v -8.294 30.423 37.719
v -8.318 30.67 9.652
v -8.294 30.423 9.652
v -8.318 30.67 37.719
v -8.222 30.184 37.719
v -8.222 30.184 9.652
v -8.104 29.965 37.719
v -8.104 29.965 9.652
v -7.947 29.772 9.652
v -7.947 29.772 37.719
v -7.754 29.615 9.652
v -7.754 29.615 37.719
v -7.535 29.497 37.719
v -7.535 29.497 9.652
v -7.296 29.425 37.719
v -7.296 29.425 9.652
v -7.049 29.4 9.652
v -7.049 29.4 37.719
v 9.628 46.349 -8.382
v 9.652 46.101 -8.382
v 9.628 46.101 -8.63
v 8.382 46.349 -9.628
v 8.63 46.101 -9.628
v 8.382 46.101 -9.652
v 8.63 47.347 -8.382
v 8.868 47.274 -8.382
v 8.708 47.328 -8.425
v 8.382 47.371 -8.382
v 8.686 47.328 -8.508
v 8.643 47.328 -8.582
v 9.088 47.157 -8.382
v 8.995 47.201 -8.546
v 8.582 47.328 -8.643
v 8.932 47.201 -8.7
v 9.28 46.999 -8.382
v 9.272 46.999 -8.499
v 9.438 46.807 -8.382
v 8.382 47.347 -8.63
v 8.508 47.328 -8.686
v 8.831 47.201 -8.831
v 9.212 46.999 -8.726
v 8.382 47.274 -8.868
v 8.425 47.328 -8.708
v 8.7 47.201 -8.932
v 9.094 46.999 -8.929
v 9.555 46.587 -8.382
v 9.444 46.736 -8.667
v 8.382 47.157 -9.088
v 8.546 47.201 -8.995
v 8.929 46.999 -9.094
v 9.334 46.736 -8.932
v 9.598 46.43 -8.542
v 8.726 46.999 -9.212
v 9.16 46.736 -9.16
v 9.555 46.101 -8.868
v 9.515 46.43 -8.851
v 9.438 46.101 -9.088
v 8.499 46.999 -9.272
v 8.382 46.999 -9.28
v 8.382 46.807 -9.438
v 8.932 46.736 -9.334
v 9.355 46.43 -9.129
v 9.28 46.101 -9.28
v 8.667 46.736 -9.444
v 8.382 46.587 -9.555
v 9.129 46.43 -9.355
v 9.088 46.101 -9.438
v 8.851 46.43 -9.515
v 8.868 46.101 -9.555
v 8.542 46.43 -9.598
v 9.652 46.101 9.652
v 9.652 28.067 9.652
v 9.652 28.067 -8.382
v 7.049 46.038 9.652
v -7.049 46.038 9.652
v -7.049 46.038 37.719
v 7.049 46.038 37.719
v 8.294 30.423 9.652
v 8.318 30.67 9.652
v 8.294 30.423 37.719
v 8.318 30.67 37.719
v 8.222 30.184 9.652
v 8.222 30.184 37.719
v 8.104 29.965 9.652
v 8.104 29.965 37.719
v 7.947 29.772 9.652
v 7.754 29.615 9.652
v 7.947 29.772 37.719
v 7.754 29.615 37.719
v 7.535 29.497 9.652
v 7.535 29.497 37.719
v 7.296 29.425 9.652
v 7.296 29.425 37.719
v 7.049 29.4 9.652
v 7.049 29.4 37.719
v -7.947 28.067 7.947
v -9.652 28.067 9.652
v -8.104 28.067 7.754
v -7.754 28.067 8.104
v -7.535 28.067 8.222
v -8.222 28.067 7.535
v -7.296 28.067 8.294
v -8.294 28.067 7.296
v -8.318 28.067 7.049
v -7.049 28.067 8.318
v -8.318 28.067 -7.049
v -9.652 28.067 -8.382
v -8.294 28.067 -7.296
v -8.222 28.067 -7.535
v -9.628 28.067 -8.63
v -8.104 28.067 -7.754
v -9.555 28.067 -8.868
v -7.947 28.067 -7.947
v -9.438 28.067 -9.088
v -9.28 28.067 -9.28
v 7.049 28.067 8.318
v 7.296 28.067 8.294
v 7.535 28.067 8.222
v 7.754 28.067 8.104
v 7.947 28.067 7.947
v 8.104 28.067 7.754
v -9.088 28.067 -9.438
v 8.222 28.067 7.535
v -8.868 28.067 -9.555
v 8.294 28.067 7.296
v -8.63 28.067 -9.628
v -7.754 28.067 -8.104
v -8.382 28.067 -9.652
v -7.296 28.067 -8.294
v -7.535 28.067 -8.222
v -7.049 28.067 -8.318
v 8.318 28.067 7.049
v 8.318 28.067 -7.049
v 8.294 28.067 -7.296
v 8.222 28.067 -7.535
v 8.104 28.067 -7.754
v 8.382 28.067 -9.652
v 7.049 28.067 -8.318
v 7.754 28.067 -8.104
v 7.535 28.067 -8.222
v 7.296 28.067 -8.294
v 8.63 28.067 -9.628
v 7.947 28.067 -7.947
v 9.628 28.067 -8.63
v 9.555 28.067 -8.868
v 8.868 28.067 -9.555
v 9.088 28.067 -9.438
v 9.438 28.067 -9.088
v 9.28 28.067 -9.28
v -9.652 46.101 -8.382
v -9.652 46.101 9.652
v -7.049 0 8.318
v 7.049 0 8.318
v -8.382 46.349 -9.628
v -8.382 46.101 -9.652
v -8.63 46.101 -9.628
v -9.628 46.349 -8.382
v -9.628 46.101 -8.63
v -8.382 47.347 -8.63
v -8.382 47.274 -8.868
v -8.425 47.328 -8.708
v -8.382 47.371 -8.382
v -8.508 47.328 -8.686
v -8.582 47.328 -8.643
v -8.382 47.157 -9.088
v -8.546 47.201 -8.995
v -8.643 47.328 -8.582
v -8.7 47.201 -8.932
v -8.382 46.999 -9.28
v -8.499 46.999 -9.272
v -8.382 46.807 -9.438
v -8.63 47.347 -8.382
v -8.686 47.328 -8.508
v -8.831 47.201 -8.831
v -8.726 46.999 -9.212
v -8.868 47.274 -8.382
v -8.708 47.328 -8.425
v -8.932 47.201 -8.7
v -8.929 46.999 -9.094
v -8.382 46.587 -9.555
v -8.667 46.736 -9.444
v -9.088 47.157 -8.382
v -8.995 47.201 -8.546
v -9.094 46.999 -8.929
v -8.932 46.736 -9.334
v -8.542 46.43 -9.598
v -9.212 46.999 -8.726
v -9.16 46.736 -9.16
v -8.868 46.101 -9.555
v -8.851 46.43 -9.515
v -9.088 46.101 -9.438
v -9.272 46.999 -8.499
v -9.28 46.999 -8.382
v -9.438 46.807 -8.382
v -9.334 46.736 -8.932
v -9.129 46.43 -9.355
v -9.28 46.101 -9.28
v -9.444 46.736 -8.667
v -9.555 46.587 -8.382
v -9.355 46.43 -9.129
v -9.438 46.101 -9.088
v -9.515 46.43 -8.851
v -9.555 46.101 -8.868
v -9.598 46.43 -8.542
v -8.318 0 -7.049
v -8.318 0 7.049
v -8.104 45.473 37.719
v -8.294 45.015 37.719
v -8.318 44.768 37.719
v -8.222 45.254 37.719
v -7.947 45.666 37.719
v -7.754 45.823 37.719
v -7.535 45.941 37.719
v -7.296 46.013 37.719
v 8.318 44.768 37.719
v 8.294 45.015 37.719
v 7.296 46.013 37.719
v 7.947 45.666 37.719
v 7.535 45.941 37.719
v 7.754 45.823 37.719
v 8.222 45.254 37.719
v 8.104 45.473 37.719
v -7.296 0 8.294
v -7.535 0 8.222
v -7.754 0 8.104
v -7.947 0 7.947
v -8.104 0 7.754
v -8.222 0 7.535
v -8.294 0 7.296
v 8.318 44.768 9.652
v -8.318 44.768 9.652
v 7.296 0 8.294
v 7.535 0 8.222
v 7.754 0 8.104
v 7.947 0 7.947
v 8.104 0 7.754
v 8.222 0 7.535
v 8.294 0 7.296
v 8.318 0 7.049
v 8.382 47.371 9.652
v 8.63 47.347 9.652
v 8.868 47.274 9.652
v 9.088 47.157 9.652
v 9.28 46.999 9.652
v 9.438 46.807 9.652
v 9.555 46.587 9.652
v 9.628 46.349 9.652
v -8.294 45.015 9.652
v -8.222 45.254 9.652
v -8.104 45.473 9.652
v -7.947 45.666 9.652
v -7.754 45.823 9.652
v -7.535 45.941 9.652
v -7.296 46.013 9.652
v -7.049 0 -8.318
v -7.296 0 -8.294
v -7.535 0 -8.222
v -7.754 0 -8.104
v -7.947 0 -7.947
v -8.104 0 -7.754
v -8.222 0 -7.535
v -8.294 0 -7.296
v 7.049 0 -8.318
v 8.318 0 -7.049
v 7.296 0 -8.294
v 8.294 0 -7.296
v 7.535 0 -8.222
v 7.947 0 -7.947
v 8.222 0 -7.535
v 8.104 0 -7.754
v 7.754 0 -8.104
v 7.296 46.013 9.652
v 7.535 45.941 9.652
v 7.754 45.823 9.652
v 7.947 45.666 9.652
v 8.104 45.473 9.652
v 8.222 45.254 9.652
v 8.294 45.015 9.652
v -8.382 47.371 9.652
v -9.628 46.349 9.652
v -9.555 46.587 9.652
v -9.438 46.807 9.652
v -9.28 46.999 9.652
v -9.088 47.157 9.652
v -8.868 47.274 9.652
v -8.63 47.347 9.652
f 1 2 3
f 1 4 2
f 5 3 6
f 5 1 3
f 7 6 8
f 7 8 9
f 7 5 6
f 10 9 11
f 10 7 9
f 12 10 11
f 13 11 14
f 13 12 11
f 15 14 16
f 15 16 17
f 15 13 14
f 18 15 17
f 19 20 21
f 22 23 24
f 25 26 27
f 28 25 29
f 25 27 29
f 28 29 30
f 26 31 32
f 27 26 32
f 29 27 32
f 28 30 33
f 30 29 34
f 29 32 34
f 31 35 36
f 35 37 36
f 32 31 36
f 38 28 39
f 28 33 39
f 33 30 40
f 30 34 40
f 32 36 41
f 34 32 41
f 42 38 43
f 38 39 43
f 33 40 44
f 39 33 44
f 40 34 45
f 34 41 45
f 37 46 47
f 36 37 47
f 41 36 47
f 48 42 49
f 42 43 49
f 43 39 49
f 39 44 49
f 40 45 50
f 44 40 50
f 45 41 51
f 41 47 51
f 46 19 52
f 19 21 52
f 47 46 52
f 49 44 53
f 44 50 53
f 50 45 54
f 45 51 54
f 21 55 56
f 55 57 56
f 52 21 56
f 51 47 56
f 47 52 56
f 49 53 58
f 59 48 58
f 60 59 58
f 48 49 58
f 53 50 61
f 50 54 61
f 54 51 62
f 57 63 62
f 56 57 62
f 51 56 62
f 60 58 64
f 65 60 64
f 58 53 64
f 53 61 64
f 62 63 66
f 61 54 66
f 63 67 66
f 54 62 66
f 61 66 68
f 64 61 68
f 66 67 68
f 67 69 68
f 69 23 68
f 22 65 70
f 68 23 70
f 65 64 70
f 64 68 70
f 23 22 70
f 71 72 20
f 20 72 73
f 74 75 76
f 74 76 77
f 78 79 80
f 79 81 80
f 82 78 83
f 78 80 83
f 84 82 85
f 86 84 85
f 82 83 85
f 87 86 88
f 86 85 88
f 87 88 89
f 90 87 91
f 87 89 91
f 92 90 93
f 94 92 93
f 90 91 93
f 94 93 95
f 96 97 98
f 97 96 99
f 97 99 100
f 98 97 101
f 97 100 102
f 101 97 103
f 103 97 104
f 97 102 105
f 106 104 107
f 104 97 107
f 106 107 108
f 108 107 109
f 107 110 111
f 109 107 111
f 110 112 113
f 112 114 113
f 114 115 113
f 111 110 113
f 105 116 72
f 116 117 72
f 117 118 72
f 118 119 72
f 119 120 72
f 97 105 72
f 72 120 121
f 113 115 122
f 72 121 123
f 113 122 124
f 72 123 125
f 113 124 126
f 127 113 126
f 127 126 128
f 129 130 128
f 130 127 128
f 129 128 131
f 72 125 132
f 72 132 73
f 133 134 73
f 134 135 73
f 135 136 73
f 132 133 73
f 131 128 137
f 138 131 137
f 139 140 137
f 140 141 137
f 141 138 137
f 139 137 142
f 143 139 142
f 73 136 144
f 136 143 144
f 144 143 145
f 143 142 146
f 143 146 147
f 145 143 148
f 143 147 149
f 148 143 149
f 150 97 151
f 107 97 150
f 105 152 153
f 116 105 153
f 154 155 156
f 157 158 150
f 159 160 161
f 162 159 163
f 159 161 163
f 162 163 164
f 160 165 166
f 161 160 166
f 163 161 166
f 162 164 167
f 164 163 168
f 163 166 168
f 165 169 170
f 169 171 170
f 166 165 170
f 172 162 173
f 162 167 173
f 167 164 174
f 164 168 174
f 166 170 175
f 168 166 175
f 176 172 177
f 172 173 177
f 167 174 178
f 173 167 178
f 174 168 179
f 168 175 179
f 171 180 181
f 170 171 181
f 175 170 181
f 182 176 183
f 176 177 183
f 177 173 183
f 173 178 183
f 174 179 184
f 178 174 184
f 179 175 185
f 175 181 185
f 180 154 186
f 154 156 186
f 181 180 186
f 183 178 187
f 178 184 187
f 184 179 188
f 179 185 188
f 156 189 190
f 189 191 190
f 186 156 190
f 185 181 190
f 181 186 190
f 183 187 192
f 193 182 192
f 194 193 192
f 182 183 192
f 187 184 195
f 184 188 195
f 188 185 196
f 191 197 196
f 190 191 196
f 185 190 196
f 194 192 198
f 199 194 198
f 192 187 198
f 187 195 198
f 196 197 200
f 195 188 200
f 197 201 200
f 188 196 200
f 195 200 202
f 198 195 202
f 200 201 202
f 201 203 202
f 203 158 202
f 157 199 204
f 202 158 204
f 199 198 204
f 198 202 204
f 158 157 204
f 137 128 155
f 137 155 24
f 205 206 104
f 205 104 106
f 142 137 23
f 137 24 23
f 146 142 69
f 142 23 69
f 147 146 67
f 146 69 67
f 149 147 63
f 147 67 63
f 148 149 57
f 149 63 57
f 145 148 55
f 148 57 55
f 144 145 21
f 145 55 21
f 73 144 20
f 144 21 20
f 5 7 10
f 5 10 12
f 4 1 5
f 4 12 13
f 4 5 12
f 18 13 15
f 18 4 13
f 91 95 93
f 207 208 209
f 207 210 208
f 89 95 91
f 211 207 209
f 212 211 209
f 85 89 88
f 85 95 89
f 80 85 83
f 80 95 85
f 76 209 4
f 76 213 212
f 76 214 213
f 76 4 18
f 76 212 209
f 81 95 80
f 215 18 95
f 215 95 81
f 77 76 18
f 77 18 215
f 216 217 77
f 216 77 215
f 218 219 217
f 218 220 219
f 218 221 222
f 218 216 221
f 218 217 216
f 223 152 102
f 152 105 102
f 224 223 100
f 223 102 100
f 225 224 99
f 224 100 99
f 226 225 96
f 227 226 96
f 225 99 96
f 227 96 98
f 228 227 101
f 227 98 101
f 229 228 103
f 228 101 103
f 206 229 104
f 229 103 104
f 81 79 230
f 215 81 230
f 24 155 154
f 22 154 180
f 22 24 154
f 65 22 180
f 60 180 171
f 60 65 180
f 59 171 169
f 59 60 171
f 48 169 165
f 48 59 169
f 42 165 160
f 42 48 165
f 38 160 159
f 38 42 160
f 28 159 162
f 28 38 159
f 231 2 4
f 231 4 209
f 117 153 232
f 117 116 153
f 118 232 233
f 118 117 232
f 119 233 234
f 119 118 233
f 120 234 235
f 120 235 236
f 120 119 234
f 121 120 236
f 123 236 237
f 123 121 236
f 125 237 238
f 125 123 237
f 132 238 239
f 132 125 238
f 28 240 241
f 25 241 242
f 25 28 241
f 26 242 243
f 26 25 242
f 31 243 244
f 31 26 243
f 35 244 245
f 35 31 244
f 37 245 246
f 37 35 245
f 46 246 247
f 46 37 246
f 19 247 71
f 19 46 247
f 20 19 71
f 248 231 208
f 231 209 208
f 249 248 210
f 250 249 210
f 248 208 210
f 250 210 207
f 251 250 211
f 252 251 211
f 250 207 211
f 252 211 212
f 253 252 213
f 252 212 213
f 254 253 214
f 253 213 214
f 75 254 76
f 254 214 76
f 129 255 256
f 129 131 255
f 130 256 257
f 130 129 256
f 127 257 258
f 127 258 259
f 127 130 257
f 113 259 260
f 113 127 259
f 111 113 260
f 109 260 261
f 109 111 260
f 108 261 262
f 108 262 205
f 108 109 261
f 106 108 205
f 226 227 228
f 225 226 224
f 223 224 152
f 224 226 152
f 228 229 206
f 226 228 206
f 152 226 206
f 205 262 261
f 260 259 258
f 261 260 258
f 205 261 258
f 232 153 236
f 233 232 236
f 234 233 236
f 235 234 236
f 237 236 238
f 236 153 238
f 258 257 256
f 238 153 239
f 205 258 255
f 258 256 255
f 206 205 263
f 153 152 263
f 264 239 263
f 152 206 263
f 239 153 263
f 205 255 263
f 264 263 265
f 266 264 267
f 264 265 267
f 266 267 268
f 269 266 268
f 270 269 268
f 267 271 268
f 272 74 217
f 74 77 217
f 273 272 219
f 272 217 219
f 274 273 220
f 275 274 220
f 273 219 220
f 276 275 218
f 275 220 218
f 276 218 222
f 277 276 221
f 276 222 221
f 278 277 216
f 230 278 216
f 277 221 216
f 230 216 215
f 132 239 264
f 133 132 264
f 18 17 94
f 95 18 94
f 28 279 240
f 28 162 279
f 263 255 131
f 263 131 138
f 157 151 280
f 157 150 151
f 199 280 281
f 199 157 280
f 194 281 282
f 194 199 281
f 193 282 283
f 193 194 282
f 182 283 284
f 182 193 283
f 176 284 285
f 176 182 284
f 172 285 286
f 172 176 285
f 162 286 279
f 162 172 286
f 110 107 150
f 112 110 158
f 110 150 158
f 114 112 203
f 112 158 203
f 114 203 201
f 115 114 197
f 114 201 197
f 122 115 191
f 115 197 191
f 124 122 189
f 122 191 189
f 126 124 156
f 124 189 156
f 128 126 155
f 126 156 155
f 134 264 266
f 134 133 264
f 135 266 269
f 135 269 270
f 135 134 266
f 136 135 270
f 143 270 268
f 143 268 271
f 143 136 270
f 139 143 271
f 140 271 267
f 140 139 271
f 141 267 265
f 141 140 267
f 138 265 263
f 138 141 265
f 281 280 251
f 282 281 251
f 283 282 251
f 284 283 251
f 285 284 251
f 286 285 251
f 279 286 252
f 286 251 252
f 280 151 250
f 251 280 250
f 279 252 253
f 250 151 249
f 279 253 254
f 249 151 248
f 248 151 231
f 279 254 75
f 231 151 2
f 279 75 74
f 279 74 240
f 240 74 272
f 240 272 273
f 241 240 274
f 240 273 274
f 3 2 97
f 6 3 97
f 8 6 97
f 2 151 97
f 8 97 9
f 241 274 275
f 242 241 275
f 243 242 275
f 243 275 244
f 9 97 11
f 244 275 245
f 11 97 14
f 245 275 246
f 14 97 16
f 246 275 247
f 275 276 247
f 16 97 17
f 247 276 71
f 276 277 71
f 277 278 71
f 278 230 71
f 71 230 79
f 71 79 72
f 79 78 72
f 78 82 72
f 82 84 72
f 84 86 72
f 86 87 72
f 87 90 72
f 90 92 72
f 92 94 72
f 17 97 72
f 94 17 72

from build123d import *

# Parameters (mm, degrees)
SKETCH1_W           = 16.637
SKETCH1_H           = 16.637
BOSS_EXTRUDE1_DEPTH = 28.067
SKETCH2_W           = 19.304
SKETCH2_H           = 19.304
BOSS_EXTRUDE2_DEPTH = 19.304
SKETCH3_W           = 16.637
SKETCH3_H           = 16.637
BOSS_EXTRUDE3_DEPTH = 28.067
FILLET1_R           = 1.27


with BuildPart() as part:
    # Sketch1 → Boss-Extrude1 (new body)
    with BuildSketch(Plane(origin=(0, 0, 0), x_dir=(1, 0, 0), z_dir=(0, 1, 0))):
        Rectangle(SKETCH1_W, SKETCH1_H)
    extrude(amount=BOSS_EXTRUDE1_DEPTH)

    # Sketch2 → Boss-Extrude2 (add)
    with BuildSketch(Plane(origin=(0, 28.067, 0), x_dir=(1, 0, 0), z_dir=(0, 1, 0))):
        Rectangle(SKETCH2_W, SKETCH2_H)
    extrude(amount=BOSS_EXTRUDE2_DEPTH)

    # Sketch3 → Boss-Extrude3 (add)
    with BuildSketch(Plane.XY.offset(9.652)):
        with Locations((0, 37.719)):
            Rectangle(SKETCH3_W, SKETCH3_H)
    extrude(amount=BOSS_EXTRUDE3_DEPTH)

    # Fillet1
    fillet1_edges = [part.edges().sort_by_distance(p)[0] for p in [
        (9.652, 37.719, -9.652),
        (-9.652, 37.719, -9.652),
        (9.652, 47.371, 0),
        (0, 47.371, -9.652),
        (-9.652, 47.371, 0),
        (8.3185, 29.4005, 23.6855),
        (8.3185, 46.0375, 23.6855),
        (-8.3185, 46.0375, 23.6855),
        (-8.3185, 29.4005, 23.6855),
        (8.3185, 14.0335, 8.3185),
        (-8.3185, 14.0335, 8.3185),
        (-8.3185, 14.0335, -8.3185),
        (8.3185, 14.0335, -8.3185),
    ]]
    fillet(fillet1_edges, radius=FILLET1_R)


solid = part.part
